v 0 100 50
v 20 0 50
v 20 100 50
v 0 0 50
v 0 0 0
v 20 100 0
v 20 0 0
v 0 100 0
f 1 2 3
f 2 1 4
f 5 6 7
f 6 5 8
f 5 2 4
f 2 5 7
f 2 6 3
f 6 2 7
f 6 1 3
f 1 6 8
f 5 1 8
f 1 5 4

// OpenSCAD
// 20 x 100 x 50 mm: does not fit --bed 100 50 20 as modelled, but fits after a 90 deg turn.
cube([20, 100, 50]);
